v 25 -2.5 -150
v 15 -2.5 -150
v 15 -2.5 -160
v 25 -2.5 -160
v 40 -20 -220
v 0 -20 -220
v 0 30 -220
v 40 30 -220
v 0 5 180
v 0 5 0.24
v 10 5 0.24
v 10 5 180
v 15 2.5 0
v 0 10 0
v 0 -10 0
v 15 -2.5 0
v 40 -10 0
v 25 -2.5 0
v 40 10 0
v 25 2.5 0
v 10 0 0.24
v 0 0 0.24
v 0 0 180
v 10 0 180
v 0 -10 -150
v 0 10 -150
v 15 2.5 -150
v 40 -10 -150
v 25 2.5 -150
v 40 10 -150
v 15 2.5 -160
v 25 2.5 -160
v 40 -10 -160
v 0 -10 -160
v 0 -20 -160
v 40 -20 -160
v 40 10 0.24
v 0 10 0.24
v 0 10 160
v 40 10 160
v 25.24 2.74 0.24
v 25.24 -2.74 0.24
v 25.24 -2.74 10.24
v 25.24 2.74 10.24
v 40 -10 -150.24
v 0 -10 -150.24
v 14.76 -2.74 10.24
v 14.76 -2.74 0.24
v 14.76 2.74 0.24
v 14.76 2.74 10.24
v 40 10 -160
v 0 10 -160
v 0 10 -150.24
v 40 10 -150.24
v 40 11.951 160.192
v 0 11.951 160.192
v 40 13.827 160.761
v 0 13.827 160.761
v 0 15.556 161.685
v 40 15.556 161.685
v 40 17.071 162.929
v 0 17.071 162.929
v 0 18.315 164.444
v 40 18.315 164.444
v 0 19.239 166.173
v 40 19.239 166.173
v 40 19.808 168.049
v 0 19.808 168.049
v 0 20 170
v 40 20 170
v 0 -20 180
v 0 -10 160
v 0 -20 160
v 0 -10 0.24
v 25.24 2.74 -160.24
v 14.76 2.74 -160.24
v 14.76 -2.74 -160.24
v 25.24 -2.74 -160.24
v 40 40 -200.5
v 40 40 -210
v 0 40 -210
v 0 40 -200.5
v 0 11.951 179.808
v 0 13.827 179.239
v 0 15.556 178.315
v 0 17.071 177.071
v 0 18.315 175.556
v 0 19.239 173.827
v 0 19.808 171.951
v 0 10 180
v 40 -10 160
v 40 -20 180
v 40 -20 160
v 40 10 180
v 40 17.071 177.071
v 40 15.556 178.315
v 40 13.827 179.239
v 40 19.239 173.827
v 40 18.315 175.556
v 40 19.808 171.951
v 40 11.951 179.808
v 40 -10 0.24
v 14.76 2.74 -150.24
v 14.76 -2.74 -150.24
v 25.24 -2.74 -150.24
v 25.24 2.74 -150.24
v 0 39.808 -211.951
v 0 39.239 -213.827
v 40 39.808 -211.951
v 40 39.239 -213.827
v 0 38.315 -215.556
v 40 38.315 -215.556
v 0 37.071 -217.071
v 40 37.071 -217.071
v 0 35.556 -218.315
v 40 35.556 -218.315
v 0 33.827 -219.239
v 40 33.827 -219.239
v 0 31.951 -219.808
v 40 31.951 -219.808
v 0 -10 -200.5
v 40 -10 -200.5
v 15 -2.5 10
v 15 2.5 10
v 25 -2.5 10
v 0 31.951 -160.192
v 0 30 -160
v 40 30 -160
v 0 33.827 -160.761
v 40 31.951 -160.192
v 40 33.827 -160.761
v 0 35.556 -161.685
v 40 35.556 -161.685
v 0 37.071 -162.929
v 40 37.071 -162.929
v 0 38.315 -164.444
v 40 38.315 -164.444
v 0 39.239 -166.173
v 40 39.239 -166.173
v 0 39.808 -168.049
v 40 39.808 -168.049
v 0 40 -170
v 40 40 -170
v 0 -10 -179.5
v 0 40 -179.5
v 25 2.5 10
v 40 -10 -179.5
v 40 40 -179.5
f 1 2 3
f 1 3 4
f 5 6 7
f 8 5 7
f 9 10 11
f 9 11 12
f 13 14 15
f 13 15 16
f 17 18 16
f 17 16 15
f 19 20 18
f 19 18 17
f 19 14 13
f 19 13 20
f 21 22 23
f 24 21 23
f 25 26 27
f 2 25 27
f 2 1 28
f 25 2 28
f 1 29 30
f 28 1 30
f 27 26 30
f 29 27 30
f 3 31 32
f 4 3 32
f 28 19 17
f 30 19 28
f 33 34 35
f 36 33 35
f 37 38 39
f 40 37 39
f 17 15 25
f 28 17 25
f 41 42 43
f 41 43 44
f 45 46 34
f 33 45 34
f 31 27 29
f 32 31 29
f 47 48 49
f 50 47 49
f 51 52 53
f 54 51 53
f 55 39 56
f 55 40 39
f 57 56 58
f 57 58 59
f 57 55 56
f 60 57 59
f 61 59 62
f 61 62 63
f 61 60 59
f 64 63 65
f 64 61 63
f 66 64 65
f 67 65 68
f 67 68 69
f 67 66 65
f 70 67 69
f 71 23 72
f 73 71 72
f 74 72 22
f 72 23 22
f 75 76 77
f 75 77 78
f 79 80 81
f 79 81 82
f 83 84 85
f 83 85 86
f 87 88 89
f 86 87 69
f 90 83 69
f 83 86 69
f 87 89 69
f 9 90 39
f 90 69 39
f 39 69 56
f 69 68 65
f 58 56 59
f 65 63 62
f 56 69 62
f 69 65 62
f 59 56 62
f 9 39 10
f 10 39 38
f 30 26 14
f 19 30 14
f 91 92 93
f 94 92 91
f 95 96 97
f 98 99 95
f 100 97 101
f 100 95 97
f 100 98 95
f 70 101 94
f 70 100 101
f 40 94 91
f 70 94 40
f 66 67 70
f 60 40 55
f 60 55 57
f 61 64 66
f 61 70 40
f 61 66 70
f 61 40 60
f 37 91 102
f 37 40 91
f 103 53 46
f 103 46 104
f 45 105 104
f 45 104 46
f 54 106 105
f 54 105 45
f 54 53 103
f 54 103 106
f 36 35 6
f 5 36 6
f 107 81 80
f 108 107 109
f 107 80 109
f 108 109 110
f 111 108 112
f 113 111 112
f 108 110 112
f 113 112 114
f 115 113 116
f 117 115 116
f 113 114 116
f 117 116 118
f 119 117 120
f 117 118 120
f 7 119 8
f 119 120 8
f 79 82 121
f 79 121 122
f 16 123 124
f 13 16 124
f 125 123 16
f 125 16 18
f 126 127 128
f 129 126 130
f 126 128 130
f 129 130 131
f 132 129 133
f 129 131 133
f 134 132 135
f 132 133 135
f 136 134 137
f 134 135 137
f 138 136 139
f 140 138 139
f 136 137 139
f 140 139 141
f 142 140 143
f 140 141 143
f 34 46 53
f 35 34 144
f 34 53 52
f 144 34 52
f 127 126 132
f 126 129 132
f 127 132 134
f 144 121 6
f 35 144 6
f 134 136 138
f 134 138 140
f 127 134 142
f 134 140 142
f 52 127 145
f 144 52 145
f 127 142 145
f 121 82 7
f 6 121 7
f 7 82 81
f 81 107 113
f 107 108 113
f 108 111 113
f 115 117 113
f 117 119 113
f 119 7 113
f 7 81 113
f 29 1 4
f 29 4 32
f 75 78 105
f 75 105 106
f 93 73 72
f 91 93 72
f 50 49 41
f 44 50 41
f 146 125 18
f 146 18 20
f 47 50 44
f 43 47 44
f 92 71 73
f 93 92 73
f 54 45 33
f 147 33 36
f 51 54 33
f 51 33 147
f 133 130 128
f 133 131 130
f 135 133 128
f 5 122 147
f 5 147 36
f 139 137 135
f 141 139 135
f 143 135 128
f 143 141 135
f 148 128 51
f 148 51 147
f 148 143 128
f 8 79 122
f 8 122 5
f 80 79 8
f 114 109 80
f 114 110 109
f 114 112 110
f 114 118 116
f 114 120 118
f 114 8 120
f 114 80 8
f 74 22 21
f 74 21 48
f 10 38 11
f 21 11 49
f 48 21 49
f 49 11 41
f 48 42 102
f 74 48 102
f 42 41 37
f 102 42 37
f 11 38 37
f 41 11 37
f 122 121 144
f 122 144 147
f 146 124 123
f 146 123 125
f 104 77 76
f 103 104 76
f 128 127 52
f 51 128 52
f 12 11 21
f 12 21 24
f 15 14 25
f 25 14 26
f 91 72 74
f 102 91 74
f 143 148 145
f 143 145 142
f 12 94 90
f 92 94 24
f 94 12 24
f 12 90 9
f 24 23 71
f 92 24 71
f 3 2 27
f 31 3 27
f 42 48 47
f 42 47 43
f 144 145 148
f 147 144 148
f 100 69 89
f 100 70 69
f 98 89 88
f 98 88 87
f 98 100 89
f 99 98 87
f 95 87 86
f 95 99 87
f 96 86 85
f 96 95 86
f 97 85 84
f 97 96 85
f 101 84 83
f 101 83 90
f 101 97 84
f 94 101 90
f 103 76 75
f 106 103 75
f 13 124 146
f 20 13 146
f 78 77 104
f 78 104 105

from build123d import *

# Parameters (mm, degrees)
BOSS_EXTRUDE1_DEPTH        = 40
FILLET1_R                  = 10
FILLET2_R                  = 10
SKETCH3_W                  = 180
SKETCH3_H                  = 5
CUT_EXTRUDE2_DEPTH         = 10
SKETCH4_W                  = 40
SKETCH4_H                  = 21
CUT_EXTRUDE3_DEPTH         = 50
CROQUIS1_W                 = 10
CROQUIS1_H                 = 5
SALIENTE_EXTRUIR1_DEPTH    = 85
INDENTACI_N1_OUTLINE_W     = 10.48
INDENTACI_N1_OUTLINE_H     = 5.48
INDENTACI_N1_DEPTH         = 10.24
INDENTACI_N1_2_OUTLINE_W   = 10.48
INDENTACI_N1_2_OUTLINE_H   = 5.48
INDENTACI_N1_2_DEPTH       = 0.24
INDENTACI_N2_START         = -160.24
INDENTACI_N2_OUTLINE_W     = 10.48
INDENTACI_N2_OUTLINE_H     = 5.48
INDENTACI_N2_DEPTH         = 10.24
INDENTACI_N2_START_2       = -150.24
INDENTACI_N2_2_OUTLINE_W   = 40
INDENTACI_N2_2_OUTLINE_H   = 20
INDENTACI_N2_2_OUTLINE_W_2 = 10.48
INDENTACI_N2_2_OUTLINE_H_2 = 5.48
INDENTACI_N2_2_DEPTH       = 0.24


# Read off the part's stored shape, not the designer's step: Indentación1, Indentación2
with BuildPart() as part:
    # Sketch2 → Boss-Extrude1 (new body)
    with BuildSketch(Plane(origin=(0, 0, 0), x_dir=(0, 0, -1), z_dir=(1, 0, 0))):
        Polygon((-160, 10), (-160, 20), (-180, 20), (-180, -20), (-160, -20), (-160, -10), (160, -10), (160, -20), (180, -20), (220, -20), (220, 40), (200, 40), (200, -10), (180, -10), (180, 40), (160, 40), (160, 10), align=None)
    extrude(amount=BOSS_EXTRUDE1_DEPTH)

    # Fillet1
    fillet1_edges = [part.edges().sort_by_distance(p)[0] for p in [
        (20, 20, 180),
        (20, 20, 160),
    ]]
    fillet(fillet1_edges, radius=FILLET1_R - 0.0001)  # a hair under: the kernel refuses the full size

    # Fillet2
    fillet2_edges = [part.edges().sort_by_distance(p)[0] for p in [
        (20, 40, -160),
        (20, 40, -220),
    ]]
    fillet(fillet2_edges, radius=FILLET2_R)

    # Sketch3 → Cut-Extrude2 (cut)
    with BuildSketch(Plane.ZY):
        with Locations((90, 2.5)):
            Rectangle(SKETCH3_W, SKETCH3_H)
    extrude(amount=-CUT_EXTRUDE2_DEPTH, mode=Mode.SUBTRACT)

    # Sketch4 → Cut-Extrude3 (cut)
    with BuildSketch(Plane(origin=(0, 40, 0), x_dir=(1, 0, 0), z_dir=(0, 1, 0))):
        with Locations((20, 190)):
            Rectangle(SKETCH4_W, SKETCH4_H)
    extrude(amount=-CUT_EXTRUDE3_DEPTH, mode=Mode.SUBTRACT)


with BuildPart() as body_2:
    # Partir1: the piece on the far side of the plane
    add(part.part)
    split(bisect_by=Plane.XY, keep=Keep.BOTTOM)


with BuildPart() as part_1:
    add(part.part)

    # Partir1
    split(bisect_by=Plane.XY, keep=Keep.TOP)

    # Indentación1 outline → Indentación1 (cut)
    with BuildSketch(Plane.XY):
        with Locations((20, 0)):
            Rectangle(INDENTACI_N1_OUTLINE_W, INDENTACI_N1_OUTLINE_H)
    extrude(amount=INDENTACI_N1_DEPTH, mode=Mode.SUBTRACT)

    # Indentaci_n1 2 outline → Indentaci_n1 2 (cut)
    with BuildSketch(Plane.XY):
        Polygon((0, -10), (40, -10), (40, 10), (0, 10), (0, 5), (10, 5), (10, 0), (0, 0), align=None)
        with Locations((20, 0)):
            Rectangle(INDENTACI_N1_2_OUTLINE_W, INDENTACI_N1_2_OUTLINE_H, mode=Mode.SUBTRACT)
    extrude(amount=INDENTACI_N1_2_DEPTH, mode=Mode.SUBTRACT)


with BuildPart() as body_3:
    # Partir2: the piece on the far side of the plane
    add(body_2.part)
    split(bisect_by=Plane.XY.offset(-150), keep=Keep.BOTTOM)

    # Indentación2 outline → Indentación2 (cut)
    with BuildSketch(Plane.XY.offset(INDENTACI_N2_START)):
        with Locations((20, 0)):
            Rectangle(INDENTACI_N2_OUTLINE_W, INDENTACI_N2_OUTLINE_H)
    extrude(amount=INDENTACI_N2_DEPTH, mode=Mode.SUBTRACT)

    # Indentaci_n2 2 outline → Indentaci_n2 2 (cut)
    with BuildSketch(Plane.XY.offset(INDENTACI_N2_START_2)):
        with Locations((20, 0)):
            Rectangle(INDENTACI_N2_2_OUTLINE_W, INDENTACI_N2_2_OUTLINE_H)
        with Locations((20, 0)):
            Rectangle(INDENTACI_N2_2_OUTLINE_W_2, INDENTACI_N2_2_OUTLINE_H_2, mode=Mode.SUBTRACT)
    extrude(amount=INDENTACI_N2_2_DEPTH, mode=Mode.SUBTRACT)


with BuildPart() as body_2_1:
    add(body_2.part)

    # Partir2
    split(bisect_by=Plane.XY.offset(-150), keep=Keep.TOP)

    # Croquis1 → Saliente-Extruir1 (add, symmetric)
    with BuildSketch(Plane.XY.offset(-75)):
        with Locations((20, 0)):
            Rectangle(CROQUIS1_W, CROQUIS1_H)
    extrude(amount=SALIENTE_EXTRUIR1_DEPTH, both=True)


solid = Compound([part_1.part, body_3.part, body_2_1.part])
